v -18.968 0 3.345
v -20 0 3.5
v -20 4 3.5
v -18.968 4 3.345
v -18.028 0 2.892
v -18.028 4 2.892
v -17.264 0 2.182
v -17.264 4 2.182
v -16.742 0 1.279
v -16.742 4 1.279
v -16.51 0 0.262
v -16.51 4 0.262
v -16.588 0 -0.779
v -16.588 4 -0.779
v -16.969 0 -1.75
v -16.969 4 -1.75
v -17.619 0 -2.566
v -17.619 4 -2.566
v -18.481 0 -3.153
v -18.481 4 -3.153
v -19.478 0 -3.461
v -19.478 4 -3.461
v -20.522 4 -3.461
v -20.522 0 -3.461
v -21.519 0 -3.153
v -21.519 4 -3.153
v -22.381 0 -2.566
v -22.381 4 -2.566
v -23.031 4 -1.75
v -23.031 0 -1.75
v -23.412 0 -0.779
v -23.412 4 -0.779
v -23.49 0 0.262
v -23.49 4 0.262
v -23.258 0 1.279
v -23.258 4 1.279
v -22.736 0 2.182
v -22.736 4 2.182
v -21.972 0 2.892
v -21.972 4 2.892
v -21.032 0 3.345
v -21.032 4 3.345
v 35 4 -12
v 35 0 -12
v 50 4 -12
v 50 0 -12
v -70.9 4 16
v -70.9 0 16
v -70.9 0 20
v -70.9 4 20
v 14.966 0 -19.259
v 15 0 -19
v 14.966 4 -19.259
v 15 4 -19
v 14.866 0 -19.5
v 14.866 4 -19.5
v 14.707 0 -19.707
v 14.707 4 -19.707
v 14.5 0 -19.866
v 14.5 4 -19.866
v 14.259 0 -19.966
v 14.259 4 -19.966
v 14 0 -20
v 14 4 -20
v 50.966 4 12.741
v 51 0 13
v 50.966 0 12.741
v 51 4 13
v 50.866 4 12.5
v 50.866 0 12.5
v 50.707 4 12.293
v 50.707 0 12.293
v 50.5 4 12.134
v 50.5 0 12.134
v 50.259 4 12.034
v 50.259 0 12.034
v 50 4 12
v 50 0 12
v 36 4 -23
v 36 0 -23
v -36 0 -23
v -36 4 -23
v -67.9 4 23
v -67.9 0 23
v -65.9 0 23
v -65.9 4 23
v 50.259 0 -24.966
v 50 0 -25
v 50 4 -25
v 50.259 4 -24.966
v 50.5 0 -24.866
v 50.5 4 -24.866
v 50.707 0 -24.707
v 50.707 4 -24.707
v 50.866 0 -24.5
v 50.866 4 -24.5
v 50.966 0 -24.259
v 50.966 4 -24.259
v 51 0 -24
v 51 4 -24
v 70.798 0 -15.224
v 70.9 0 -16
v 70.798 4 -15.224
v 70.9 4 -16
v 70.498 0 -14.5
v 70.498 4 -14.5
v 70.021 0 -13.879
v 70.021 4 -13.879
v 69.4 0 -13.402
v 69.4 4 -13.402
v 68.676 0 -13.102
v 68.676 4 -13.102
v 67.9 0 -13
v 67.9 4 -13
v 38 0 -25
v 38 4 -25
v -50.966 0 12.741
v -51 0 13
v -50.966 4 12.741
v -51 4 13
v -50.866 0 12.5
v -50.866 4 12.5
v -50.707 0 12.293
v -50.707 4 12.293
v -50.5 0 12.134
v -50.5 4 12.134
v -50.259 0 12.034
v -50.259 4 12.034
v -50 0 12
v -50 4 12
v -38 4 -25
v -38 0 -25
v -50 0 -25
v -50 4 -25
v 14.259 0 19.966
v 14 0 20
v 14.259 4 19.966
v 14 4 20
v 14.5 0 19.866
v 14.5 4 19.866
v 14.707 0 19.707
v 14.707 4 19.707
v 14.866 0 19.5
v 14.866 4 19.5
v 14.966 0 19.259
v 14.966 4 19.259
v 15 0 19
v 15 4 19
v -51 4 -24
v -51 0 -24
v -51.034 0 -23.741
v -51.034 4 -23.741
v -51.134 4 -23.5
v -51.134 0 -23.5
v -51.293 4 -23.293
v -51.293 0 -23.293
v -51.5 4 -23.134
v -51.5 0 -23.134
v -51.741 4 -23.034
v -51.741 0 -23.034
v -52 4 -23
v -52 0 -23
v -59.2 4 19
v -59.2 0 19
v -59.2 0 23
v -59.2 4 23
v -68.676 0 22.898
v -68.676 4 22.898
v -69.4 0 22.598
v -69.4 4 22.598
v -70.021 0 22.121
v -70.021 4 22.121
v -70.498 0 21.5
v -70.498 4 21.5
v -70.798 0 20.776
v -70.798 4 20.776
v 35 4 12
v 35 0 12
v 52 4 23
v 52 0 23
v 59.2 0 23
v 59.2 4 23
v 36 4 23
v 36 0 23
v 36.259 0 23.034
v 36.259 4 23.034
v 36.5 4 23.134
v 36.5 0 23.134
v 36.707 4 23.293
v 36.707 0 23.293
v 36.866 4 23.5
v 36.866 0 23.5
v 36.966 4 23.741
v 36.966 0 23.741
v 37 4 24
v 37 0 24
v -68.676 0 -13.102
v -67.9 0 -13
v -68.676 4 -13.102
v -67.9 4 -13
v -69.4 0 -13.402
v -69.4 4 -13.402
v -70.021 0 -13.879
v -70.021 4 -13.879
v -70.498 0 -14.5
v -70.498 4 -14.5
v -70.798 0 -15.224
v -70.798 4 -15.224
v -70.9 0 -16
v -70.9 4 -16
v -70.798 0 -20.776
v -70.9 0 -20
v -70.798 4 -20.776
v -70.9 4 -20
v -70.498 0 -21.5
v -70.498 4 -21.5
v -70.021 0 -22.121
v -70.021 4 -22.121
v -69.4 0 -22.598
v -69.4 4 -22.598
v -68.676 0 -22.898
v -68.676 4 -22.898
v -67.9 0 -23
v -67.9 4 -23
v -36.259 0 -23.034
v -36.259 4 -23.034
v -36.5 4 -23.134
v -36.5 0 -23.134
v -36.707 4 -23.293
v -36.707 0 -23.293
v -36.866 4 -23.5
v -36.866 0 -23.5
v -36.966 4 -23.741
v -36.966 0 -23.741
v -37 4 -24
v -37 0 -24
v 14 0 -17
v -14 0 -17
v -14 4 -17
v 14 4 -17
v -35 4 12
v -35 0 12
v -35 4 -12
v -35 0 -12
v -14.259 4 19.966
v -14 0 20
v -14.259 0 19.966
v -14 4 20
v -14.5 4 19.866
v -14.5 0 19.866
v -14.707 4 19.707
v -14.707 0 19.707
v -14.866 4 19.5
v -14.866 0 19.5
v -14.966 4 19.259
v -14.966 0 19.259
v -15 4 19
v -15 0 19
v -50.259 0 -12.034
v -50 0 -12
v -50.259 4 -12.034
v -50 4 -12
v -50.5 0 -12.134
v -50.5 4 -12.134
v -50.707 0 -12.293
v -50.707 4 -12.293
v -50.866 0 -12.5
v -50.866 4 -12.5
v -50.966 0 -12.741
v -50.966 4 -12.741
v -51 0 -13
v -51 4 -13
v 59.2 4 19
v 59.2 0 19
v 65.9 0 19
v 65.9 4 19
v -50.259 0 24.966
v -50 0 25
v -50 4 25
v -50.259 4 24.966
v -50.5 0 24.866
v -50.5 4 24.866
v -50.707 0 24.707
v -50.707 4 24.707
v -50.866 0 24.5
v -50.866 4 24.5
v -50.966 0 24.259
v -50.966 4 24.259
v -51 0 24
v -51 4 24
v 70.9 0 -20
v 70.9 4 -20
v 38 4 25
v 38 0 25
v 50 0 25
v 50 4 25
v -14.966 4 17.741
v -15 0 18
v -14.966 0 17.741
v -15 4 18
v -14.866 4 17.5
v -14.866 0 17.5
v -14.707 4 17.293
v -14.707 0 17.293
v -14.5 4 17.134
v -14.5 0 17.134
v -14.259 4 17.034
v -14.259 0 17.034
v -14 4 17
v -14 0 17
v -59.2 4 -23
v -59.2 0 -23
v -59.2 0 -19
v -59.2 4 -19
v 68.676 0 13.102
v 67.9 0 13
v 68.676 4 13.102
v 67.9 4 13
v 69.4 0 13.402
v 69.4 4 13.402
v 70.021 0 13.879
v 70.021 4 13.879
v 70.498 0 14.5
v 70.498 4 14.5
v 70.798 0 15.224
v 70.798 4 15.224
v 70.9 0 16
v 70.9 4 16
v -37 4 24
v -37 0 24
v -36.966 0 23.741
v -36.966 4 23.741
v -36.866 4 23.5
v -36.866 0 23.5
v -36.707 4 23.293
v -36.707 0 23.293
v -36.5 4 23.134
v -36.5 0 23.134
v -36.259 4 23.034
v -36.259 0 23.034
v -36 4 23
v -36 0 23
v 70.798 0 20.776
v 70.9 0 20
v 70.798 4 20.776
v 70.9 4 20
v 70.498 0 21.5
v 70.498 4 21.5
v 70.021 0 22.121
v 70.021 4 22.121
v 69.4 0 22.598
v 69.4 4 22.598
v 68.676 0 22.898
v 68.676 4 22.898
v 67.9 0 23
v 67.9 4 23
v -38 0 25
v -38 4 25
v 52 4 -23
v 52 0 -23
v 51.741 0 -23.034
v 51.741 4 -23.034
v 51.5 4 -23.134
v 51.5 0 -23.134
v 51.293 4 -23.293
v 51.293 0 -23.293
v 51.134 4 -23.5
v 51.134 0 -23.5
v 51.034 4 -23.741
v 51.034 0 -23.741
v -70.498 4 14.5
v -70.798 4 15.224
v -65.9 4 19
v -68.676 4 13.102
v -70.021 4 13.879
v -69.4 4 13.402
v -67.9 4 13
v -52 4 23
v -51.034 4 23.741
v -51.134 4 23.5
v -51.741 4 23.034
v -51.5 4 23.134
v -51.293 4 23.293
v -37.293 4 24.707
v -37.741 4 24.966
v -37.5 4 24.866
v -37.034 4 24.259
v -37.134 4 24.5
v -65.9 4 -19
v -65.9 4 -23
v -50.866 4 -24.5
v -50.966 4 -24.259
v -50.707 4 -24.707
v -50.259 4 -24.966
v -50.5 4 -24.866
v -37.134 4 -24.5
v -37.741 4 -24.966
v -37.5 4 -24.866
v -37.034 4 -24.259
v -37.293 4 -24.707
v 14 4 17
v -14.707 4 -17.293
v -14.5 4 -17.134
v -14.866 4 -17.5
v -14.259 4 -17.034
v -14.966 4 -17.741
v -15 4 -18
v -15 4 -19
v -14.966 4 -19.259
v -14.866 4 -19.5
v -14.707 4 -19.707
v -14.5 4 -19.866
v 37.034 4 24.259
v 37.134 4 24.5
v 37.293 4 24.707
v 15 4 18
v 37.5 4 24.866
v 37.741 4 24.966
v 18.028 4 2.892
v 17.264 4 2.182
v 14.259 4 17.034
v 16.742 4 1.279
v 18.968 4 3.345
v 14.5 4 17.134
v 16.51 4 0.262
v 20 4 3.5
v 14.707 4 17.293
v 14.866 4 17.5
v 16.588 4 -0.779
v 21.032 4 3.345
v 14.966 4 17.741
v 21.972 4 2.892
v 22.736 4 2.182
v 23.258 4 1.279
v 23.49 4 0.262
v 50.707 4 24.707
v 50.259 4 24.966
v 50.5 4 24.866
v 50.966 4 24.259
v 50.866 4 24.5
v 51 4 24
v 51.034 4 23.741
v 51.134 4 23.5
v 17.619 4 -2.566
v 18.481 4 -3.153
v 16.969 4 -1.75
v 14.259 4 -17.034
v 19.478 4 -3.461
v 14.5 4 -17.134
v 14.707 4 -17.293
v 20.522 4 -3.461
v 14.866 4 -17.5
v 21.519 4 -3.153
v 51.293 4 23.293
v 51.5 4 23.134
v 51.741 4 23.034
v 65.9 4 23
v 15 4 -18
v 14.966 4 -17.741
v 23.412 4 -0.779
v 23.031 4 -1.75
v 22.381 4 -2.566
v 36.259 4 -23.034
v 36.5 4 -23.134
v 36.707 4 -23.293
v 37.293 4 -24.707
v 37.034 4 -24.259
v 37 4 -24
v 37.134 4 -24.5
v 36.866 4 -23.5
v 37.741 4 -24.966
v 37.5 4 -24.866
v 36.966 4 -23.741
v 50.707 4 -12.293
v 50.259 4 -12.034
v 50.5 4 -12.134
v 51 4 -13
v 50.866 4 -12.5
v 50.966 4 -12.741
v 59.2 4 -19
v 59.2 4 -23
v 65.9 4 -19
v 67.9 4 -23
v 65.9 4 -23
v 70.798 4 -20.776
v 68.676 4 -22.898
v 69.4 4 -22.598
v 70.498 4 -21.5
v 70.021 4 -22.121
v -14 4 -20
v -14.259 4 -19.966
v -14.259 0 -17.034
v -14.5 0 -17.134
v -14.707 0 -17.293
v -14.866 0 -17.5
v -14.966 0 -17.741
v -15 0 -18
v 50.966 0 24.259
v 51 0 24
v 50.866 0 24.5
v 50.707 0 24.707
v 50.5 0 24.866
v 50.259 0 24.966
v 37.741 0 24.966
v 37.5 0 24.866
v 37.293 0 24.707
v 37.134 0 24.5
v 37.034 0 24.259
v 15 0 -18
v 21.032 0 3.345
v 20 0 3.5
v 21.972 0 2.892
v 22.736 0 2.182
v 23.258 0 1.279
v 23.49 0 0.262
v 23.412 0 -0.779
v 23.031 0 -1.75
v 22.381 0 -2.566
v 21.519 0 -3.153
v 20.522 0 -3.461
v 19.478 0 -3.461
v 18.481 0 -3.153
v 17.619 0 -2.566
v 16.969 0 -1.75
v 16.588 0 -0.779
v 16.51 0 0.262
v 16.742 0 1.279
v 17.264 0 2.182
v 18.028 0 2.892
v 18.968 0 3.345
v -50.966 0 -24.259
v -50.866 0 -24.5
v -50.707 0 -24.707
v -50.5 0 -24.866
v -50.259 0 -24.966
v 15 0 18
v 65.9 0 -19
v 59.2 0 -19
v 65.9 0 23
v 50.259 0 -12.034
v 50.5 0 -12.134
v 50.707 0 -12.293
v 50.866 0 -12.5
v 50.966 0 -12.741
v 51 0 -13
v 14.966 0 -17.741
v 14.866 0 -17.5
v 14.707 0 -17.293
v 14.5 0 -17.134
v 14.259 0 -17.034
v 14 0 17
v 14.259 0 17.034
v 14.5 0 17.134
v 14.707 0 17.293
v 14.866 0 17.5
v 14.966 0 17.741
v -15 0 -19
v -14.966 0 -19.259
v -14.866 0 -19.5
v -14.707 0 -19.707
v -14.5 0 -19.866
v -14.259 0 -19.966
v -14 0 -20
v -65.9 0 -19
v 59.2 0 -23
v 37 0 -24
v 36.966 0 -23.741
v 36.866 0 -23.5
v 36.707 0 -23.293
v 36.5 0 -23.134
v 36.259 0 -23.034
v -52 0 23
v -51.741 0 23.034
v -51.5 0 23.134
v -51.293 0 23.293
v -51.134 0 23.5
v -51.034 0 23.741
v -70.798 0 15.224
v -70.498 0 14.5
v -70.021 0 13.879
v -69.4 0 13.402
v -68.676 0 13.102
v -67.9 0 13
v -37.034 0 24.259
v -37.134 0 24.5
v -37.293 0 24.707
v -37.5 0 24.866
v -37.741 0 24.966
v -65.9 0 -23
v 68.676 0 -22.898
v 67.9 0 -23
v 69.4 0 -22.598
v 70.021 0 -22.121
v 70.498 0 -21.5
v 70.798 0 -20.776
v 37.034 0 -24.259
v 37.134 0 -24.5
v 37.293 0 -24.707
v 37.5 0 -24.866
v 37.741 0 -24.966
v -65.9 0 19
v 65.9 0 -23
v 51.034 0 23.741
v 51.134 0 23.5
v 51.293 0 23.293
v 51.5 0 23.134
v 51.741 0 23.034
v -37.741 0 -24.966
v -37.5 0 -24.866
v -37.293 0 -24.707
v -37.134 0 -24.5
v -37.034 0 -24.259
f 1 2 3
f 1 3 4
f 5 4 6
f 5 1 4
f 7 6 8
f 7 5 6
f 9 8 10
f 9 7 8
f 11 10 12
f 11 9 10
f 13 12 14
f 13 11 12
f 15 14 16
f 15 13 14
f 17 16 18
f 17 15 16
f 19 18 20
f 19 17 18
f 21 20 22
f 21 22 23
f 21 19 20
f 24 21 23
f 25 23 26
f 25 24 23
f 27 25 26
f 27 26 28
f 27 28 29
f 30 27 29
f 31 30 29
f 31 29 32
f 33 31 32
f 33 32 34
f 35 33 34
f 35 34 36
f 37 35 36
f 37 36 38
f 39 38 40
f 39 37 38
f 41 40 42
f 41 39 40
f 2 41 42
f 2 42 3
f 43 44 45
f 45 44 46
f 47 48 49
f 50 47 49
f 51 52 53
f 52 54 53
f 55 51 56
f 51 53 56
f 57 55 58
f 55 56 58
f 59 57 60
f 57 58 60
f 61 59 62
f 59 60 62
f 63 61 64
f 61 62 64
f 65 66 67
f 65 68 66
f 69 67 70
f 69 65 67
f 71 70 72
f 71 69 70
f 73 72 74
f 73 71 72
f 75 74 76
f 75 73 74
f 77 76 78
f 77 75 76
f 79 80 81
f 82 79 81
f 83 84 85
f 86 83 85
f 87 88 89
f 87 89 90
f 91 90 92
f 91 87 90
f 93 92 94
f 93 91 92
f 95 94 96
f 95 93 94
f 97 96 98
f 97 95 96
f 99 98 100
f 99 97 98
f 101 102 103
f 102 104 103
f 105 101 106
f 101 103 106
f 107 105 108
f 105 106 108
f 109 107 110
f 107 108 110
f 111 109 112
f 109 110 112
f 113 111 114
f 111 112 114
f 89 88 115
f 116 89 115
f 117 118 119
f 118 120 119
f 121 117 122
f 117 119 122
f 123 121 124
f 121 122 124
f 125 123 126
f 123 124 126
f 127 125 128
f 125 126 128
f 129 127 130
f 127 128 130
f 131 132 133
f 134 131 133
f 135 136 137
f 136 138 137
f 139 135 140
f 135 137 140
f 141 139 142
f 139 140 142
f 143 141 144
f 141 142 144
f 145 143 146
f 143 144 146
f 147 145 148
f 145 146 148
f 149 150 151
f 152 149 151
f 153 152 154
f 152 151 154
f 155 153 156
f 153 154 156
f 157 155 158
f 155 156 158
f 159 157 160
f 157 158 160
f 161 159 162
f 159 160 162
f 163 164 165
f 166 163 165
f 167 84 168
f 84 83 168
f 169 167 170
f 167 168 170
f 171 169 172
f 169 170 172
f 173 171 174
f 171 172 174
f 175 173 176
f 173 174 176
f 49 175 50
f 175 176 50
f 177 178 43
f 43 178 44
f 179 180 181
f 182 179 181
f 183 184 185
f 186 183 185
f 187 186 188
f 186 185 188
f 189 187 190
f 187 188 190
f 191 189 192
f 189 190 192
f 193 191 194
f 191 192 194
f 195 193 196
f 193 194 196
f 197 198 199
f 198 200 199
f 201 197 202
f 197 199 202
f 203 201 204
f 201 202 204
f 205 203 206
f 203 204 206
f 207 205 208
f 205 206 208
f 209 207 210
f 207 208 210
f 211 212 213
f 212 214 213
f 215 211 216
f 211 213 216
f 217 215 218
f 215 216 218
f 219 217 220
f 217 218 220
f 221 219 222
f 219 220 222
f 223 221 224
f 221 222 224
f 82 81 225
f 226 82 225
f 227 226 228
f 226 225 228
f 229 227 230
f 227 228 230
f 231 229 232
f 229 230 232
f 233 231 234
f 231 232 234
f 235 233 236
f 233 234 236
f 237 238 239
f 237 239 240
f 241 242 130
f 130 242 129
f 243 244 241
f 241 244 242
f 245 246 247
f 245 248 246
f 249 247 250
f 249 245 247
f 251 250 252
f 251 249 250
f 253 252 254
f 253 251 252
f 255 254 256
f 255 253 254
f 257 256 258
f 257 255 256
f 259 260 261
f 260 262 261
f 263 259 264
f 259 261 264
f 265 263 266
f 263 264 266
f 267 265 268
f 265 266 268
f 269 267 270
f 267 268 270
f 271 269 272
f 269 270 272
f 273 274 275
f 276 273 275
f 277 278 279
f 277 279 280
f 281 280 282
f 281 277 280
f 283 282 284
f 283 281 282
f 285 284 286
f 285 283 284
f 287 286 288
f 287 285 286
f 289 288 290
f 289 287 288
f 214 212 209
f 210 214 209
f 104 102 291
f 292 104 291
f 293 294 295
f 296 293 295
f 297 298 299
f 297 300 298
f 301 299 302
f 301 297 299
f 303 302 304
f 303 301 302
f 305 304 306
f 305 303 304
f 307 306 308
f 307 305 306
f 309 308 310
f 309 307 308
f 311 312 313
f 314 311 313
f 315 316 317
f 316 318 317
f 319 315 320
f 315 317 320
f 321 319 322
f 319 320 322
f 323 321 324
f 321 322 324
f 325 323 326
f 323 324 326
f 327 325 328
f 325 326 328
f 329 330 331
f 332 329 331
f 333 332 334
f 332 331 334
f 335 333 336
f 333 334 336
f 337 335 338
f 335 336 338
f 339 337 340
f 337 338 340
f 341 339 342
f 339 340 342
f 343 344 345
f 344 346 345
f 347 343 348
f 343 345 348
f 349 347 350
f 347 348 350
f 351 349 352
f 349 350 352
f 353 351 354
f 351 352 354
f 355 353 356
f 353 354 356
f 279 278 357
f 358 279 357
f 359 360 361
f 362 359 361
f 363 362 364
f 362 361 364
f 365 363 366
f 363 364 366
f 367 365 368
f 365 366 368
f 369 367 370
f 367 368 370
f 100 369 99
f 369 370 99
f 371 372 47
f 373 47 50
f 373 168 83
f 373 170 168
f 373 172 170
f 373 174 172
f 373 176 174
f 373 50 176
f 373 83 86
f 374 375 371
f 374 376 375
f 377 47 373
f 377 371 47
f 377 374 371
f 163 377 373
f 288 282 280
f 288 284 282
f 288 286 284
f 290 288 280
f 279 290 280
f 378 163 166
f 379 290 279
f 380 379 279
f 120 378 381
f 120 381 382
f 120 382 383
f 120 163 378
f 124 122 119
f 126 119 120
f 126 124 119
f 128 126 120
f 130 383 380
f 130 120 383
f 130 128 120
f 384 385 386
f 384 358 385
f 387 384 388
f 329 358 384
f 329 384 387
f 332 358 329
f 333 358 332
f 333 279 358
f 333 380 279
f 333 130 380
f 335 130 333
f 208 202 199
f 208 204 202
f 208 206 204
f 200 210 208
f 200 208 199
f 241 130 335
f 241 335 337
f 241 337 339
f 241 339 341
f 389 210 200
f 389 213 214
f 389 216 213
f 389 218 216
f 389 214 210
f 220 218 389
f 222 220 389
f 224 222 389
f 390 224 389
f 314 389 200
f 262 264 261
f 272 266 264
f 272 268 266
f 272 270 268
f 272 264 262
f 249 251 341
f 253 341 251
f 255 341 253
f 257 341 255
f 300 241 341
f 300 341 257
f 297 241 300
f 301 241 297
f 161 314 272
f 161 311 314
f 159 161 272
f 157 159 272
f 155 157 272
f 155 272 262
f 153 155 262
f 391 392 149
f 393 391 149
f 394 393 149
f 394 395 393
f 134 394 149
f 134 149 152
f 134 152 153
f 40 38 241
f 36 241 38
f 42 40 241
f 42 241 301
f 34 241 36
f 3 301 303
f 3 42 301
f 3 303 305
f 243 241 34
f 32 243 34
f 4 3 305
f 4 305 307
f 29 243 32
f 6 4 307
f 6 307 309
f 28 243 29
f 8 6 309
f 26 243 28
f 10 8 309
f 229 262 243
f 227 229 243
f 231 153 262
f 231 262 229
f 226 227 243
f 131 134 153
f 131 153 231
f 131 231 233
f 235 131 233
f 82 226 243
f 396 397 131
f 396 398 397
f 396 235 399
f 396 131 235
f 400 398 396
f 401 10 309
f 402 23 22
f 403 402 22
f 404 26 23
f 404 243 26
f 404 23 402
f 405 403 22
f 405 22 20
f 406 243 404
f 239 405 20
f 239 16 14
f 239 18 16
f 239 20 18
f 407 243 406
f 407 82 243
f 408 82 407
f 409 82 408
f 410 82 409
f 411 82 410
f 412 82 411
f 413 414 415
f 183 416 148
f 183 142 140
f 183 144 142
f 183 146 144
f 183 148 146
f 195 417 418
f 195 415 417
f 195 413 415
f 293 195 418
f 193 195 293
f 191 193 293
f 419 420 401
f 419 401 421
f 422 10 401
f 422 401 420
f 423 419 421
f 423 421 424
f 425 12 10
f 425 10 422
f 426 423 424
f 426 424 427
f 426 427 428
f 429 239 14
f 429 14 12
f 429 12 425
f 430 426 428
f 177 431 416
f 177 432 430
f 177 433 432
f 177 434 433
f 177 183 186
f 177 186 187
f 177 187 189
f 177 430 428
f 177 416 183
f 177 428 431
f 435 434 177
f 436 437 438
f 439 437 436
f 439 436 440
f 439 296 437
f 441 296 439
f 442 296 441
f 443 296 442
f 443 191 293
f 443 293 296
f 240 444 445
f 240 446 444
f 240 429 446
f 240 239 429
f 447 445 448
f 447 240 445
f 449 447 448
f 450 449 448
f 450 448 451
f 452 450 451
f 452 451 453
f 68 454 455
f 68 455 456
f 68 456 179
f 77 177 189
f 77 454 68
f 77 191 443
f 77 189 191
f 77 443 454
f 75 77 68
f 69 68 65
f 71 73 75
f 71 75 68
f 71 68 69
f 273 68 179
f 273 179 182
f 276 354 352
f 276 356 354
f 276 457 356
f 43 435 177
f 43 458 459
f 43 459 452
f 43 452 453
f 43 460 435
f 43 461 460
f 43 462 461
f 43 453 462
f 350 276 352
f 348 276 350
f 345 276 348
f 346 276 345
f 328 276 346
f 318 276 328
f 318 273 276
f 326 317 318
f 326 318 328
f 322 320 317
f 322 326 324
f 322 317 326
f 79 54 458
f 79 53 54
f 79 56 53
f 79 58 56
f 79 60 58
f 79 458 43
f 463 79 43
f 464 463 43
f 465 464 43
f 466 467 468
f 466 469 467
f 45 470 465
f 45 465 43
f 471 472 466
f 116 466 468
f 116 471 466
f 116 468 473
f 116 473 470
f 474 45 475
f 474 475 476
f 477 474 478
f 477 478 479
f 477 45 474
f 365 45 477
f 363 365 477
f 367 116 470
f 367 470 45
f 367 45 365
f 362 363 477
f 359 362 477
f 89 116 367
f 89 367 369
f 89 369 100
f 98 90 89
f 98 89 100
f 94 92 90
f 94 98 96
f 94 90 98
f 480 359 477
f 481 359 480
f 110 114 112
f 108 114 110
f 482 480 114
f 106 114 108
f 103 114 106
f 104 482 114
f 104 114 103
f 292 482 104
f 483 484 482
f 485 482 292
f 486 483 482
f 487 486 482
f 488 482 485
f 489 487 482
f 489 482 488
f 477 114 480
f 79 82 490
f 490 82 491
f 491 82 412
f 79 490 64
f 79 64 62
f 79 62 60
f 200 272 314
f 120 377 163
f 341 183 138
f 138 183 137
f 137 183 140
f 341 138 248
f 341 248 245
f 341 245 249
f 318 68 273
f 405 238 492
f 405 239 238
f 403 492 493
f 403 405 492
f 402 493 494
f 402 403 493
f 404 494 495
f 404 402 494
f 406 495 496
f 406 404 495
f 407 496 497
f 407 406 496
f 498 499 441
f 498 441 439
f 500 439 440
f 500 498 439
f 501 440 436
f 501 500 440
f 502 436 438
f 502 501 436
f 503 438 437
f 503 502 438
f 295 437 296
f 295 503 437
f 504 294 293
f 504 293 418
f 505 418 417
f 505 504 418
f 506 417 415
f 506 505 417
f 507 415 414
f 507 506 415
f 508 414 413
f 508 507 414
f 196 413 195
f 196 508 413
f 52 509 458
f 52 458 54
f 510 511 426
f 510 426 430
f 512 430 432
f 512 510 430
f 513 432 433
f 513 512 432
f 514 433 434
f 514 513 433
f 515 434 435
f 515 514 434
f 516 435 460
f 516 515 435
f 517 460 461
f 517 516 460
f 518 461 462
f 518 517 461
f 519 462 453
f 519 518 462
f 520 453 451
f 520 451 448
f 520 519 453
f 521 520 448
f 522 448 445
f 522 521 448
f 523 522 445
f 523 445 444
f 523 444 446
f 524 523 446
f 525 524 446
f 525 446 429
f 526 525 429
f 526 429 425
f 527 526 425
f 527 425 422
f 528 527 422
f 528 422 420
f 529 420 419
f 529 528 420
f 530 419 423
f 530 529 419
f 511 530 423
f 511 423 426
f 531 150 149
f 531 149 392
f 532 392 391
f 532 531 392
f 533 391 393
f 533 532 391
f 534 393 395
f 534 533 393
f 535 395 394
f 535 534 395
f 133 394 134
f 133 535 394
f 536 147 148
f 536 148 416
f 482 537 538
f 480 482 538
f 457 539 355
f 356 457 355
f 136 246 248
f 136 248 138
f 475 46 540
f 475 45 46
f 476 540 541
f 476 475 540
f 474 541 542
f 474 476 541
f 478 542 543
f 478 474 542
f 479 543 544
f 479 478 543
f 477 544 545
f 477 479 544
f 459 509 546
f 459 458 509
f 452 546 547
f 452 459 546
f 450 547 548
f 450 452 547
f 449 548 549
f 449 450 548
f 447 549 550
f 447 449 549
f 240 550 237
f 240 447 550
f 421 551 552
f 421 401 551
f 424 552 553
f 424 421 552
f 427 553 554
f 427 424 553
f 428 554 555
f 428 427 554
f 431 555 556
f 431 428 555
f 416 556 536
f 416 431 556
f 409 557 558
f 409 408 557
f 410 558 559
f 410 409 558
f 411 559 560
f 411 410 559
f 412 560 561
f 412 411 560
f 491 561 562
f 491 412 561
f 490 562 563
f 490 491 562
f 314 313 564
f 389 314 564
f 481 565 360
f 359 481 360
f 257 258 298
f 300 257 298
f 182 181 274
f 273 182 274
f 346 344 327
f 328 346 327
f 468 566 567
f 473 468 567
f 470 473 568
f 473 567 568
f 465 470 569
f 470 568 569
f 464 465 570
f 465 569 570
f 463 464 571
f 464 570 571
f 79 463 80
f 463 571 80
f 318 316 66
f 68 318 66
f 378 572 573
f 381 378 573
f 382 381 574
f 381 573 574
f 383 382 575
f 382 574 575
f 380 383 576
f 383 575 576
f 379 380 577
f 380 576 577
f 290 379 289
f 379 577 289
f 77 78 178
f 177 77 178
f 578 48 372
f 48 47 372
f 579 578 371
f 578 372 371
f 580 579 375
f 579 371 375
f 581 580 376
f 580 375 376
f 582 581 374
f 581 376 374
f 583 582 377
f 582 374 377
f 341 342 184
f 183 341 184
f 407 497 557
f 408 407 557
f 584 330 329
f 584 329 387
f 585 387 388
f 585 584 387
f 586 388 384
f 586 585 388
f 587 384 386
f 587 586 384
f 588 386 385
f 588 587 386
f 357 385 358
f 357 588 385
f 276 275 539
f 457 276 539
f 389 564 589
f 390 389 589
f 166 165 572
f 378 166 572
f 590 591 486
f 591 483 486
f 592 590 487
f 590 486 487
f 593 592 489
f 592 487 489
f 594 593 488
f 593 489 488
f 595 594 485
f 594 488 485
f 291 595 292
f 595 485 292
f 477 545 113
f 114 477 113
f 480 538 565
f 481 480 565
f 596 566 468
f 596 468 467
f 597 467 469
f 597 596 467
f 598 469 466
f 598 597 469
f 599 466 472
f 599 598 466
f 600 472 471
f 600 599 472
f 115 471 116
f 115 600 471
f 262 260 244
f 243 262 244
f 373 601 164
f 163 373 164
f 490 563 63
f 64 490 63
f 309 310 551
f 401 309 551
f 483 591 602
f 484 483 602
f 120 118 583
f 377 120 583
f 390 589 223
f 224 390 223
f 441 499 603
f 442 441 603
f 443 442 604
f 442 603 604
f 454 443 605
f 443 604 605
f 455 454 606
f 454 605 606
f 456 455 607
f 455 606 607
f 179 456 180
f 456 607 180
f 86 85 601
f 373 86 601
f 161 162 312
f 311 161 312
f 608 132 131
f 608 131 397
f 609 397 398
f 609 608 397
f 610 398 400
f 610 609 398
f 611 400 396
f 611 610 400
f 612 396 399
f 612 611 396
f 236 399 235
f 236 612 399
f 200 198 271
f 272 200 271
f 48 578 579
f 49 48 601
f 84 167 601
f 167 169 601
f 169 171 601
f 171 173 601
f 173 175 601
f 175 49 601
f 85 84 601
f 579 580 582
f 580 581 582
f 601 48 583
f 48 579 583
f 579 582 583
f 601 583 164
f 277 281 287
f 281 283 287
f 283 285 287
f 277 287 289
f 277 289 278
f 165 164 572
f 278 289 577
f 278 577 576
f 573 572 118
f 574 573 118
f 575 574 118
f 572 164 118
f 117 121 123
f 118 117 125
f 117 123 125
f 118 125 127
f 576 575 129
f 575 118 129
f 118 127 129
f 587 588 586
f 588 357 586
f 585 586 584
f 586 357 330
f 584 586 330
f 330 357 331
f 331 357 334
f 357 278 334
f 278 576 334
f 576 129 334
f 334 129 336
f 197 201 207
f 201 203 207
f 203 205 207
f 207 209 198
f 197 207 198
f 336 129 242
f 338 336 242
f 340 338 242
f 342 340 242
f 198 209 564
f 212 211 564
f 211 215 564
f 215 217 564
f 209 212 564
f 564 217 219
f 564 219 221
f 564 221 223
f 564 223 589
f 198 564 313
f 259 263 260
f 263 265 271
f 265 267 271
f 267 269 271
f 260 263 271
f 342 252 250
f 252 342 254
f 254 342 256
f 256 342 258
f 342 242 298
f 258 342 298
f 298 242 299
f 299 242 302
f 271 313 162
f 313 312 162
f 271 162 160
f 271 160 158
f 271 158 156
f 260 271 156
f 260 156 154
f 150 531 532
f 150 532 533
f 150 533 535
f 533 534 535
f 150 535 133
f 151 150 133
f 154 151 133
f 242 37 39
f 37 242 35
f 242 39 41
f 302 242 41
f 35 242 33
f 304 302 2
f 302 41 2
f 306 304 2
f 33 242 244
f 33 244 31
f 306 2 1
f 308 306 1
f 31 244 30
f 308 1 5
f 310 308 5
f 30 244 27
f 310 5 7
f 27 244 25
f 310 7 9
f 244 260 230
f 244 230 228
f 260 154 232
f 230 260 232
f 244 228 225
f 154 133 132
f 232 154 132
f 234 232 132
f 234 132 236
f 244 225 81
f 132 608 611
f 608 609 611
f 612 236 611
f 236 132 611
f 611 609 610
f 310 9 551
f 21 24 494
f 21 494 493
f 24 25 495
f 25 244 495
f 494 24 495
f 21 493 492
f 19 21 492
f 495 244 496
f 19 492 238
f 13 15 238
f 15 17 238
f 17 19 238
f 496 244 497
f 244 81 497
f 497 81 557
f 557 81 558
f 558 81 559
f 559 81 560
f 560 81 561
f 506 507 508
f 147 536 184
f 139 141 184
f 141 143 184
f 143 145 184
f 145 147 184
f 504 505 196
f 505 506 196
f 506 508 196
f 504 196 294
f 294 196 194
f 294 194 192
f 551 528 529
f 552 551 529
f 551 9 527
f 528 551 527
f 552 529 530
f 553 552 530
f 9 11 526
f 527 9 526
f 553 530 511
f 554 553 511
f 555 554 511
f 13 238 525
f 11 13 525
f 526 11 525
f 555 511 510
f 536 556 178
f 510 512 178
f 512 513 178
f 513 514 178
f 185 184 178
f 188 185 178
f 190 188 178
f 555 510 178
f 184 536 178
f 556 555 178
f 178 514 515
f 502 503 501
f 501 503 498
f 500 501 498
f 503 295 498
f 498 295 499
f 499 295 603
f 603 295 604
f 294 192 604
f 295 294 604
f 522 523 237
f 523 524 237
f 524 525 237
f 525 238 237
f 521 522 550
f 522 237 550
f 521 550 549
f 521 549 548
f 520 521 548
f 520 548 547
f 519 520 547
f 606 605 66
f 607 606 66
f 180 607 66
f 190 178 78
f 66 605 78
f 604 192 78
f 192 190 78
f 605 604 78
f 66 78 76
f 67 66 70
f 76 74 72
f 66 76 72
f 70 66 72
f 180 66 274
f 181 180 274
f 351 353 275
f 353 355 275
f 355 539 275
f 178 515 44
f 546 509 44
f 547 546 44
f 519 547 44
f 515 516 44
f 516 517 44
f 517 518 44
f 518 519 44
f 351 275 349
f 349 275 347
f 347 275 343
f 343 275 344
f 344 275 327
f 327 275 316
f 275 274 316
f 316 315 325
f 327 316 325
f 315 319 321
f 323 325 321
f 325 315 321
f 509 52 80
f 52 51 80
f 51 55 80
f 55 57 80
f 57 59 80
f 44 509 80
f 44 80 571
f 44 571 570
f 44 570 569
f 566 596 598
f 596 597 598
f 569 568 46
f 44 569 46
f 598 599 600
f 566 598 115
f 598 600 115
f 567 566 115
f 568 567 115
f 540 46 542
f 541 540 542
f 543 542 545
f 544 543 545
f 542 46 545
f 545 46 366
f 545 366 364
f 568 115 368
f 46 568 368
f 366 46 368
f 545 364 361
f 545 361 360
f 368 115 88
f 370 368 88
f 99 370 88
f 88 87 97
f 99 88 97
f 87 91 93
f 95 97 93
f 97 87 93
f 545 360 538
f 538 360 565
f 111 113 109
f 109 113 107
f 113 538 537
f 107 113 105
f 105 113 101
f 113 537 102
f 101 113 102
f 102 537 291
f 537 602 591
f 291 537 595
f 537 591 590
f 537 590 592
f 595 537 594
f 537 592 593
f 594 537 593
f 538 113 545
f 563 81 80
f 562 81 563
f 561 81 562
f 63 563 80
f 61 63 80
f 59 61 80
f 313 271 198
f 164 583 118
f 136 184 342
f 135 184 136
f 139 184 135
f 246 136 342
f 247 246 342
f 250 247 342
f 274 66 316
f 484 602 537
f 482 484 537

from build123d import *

# Parameters (mm, degrees)
SCHIZZO1_W                   = 30
SCHIZZO1_H                   = 3
SCHIZZO1_R                   = 3.5
ESTRUSIONE_ESTRUSIONE1_DEPTH = 4
RACCORDO1_START              = -1
RACCORDO1_DEPTH              = 6
RACCORDO1_2_DEPTH            = 4
RACCORDO2_R                  = 3
RACCORDO3_R                  = 1
RACCORDO4_R                  = 1


with BuildPart() as part:
    # Schizzo1 → Estrusione-Estrusione1 (new body)
    with BuildSketch(Plane(origin=(0, 0, 0), x_dir=(1, 0, 0), z_dir=(0, 1, 0))):
        Polygon((-65.9, 19), (-65.9, 23), (-70.9, 23), (-70.9, 13), (-51, 13), (-51, 12), (-35, 12), (-35, -12), (-51, -12), (-51, -13), (-70.9, -13), (-70.9, -23), (-65.9, -23), (-65.9, -19), (-59.2, -19), (-59.2, -23), (-51, -23), (-51, -25), (-37, -25), (-37, -23), (37, -23), (37, -25), (51, -25), (51, -23), (59.2, -23), (59.2, -19), (65.9, -19), (65.9, -23), (70.9, -23), (70.9, -13), (51, -13), (51, -12), (35, -12), (35, 12), (51, 12), (51, 13), (70.9, 13), (70.9, 23), (65.9, 23), (65.9, 19), (59.2, 19), (59.2, 23), (51, 23), (51, 25), (37, 25), (37, 23), (-37, 23), (-37, 25), (-51, 25), (-51, 23), (-59.2, 23), (-59.2, 19), align=None)
        with Locations((0, -18.5)):
            Rectangle(SCHIZZO1_W, SCHIZZO1_H, mode=Mode.SUBTRACT)
        with Locations(Location((20, 0, 0), (0, 0, 270))):
            Circle(SCHIZZO1_R, mode=Mode.SUBTRACT)
        with Locations((0, 18.5)):
            Rectangle(SCHIZZO1_W, SCHIZZO1_H, mode=Mode.SUBTRACT)
        with Locations(Location((-20, 0, 0), (0, 0, 270))):
            Circle(SCHIZZO1_R, mode=Mode.SUBTRACT)
    extrude(amount=ESTRUSIONE_ESTRUSIONE1_DEPTH)

    # Raccordo1: read off the stored shape, not the designer's step
    # Raccordo1 outline → Raccordo1 (cut)
    with BuildSketch(Plane(origin=(0, 0, 0), x_dir=(1, 0, 0), z_dir=(0, 1, 0)).offset(RACCORDO1_START)):
        with BuildLine():
            Line((51, -25), (51, -24))
            ThreePointArc((51, -24), (50.707106781, -24.707106781), (50, -25))
            Line((50, -25), (51, -25))
        make_face()
        with BuildLine():
            Line((-51, -25), (-50, -25))
            ThreePointArc((-50, -25), (-50.707106781, -24.707106781), (-51, -24))
            Line((-51, -24), (-51, -25))
        make_face()
        with BuildLine():
            Line((-37, -25), (-37, -24))
            ThreePointArc((-37, -24), (-37.292893219, -24.707106781), (-38, -25))
            Line((-38, -25), (-37, -25))
        make_face()
        with BuildLine():
            Line((37, -25), (38, -25))
            ThreePointArc((38, -25), (37.292893219, -24.707106781), (37, -24))
            Line((37, -24), (37, -25))
        make_face()
        with BuildLine():
            Line((37, 25), (37, 24))
            ThreePointArc((37, 24), (37.292893219, 24.707106781), (38, 25))
            Line((38, 25), (37, 25))
        make_face()
        with BuildLine():
            ThreePointArc((-51, 24), (-50.707106781, 24.707106781), (-50, 25))
            Line((-50, 25), (-51, 25))
            Line((-51, 25), (-51, 24))
        make_face()
        with BuildLine():
            ThreePointArc((-38, 25), (-37.292893219, 24.707106781), (-37, 24))
            Line((-37, 24), (-37, 25))
            Line((-37, 25), (-38, 25))
        make_face()
        with BuildLine():
            Line((51, 25), (50, 25))
            ThreePointArc((50, 25), (50.707106781, 24.707106781), (51, 24))
            Line((51, 24), (51, 25))
        make_face()
    extrude(amount=RACCORDO1_DEPTH, mode=Mode.SUBTRACT)

    # Raccordo1 2 outline → Raccordo1 2 (add)
    with BuildSketch(Plane(origin=(0, 0, 0), x_dir=(1, 0, 0), z_dir=(0, 1, 0))):
        with BuildLine():
            Line((51, -23), (51, -24))
            ThreePointArc((51, -24), (51.292893219, -23.292893219), (52, -23))
            Line((52, -23), (51, -23))
        make_face()
        with BuildLine():
            ThreePointArc((-52, -23), (-51.292893219, -23.292893219), (-51, -24))
            Line((-51, -24), (-51, -23))
            Line((-51, -23), (-52, -23))
        make_face()
        with BuildLine():
            ThreePointArc((-37, -24), (-36.707106781, -23.292893219), (-36, -23))
            Line((-36, -23), (-37, -23))
            Line((-37, -23), (-37, -24))
        make_face()
        with BuildLine():
            ThreePointArc((36, -23), (36.707106781, -23.292893219), (37, -24))
            Line((37, -24), (37, -23))
            Line((37, -23), (36, -23))
        make_face()
        with BuildLine():
            Line((37, 23), (37, 24))
            ThreePointArc((37, 24), (36.707106781, 23.292893219), (36, 23))
            Line((36, 23), (37, 23))
        make_face()
        with BuildLine():
            Line((-51, 23), (-51, 24))
            ThreePointArc((-51, 24), (-51.292893219, 23.292893219), (-52, 23))
            Line((-52, 23), (-51, 23))
        make_face()
        with BuildLine():
            Line((-37, 23), (-36, 23))
            ThreePointArc((-36, 23), (-36.707106781, 23.292893219), (-37, 24))
            Line((-37, 24), (-37, 23))
        make_face()
        with BuildLine():
            ThreePointArc((52, 23), (51.292893219, 23.292893219), (51, 24))
            Line((51, 24), (51, 23))
            Line((51, 23), (52, 23))
        make_face()
    extrude(amount=RACCORDO1_2_DEPTH)

    # Raccordo2
    raccordo2_edges = [part.edges().sort_by_distance(p)[0] for p in [
        (70.9, 2, 13),
        (70.9, 2, 23),
        (-70.9, 2, 23),
        (-70.9, 2, 13),
        (-70.9, 2, -13),
        (-70.9, 2, -23),
        (70.9, 2, -23),
        (70.9, 2, -13),
    ]]
    fillet(raccordo2_edges, radius=RACCORDO2_R)

    # Raccordo3
    raccordo3_edges = [part.edges().sort_by_distance(p)[0] for p in [
        (51, 2, -12),
        (51, 2, 12),
        (-51, 2, 12),
        (-51, 2, -12),
    ]]
    fillet(raccordo3_edges, radius=RACCORDO3_R - 0.0001)  # a hair under: the kernel refuses the full size

    # Raccordo4
    raccordo4_edges = [part.edges().sort_by_distance(p)[0] for p in [
        (15, 2, 17),
        (-15, 2, 17),
        (-15, 2, 20),
        (15, 2, 20),
        (15, 2, -20),
        (-15, 2, -20),
        (-15, 2, -17),
        (15, 2, -17),
    ]]
    fillet(raccordo4_edges, radius=RACCORDO4_R)


solid = part.part
